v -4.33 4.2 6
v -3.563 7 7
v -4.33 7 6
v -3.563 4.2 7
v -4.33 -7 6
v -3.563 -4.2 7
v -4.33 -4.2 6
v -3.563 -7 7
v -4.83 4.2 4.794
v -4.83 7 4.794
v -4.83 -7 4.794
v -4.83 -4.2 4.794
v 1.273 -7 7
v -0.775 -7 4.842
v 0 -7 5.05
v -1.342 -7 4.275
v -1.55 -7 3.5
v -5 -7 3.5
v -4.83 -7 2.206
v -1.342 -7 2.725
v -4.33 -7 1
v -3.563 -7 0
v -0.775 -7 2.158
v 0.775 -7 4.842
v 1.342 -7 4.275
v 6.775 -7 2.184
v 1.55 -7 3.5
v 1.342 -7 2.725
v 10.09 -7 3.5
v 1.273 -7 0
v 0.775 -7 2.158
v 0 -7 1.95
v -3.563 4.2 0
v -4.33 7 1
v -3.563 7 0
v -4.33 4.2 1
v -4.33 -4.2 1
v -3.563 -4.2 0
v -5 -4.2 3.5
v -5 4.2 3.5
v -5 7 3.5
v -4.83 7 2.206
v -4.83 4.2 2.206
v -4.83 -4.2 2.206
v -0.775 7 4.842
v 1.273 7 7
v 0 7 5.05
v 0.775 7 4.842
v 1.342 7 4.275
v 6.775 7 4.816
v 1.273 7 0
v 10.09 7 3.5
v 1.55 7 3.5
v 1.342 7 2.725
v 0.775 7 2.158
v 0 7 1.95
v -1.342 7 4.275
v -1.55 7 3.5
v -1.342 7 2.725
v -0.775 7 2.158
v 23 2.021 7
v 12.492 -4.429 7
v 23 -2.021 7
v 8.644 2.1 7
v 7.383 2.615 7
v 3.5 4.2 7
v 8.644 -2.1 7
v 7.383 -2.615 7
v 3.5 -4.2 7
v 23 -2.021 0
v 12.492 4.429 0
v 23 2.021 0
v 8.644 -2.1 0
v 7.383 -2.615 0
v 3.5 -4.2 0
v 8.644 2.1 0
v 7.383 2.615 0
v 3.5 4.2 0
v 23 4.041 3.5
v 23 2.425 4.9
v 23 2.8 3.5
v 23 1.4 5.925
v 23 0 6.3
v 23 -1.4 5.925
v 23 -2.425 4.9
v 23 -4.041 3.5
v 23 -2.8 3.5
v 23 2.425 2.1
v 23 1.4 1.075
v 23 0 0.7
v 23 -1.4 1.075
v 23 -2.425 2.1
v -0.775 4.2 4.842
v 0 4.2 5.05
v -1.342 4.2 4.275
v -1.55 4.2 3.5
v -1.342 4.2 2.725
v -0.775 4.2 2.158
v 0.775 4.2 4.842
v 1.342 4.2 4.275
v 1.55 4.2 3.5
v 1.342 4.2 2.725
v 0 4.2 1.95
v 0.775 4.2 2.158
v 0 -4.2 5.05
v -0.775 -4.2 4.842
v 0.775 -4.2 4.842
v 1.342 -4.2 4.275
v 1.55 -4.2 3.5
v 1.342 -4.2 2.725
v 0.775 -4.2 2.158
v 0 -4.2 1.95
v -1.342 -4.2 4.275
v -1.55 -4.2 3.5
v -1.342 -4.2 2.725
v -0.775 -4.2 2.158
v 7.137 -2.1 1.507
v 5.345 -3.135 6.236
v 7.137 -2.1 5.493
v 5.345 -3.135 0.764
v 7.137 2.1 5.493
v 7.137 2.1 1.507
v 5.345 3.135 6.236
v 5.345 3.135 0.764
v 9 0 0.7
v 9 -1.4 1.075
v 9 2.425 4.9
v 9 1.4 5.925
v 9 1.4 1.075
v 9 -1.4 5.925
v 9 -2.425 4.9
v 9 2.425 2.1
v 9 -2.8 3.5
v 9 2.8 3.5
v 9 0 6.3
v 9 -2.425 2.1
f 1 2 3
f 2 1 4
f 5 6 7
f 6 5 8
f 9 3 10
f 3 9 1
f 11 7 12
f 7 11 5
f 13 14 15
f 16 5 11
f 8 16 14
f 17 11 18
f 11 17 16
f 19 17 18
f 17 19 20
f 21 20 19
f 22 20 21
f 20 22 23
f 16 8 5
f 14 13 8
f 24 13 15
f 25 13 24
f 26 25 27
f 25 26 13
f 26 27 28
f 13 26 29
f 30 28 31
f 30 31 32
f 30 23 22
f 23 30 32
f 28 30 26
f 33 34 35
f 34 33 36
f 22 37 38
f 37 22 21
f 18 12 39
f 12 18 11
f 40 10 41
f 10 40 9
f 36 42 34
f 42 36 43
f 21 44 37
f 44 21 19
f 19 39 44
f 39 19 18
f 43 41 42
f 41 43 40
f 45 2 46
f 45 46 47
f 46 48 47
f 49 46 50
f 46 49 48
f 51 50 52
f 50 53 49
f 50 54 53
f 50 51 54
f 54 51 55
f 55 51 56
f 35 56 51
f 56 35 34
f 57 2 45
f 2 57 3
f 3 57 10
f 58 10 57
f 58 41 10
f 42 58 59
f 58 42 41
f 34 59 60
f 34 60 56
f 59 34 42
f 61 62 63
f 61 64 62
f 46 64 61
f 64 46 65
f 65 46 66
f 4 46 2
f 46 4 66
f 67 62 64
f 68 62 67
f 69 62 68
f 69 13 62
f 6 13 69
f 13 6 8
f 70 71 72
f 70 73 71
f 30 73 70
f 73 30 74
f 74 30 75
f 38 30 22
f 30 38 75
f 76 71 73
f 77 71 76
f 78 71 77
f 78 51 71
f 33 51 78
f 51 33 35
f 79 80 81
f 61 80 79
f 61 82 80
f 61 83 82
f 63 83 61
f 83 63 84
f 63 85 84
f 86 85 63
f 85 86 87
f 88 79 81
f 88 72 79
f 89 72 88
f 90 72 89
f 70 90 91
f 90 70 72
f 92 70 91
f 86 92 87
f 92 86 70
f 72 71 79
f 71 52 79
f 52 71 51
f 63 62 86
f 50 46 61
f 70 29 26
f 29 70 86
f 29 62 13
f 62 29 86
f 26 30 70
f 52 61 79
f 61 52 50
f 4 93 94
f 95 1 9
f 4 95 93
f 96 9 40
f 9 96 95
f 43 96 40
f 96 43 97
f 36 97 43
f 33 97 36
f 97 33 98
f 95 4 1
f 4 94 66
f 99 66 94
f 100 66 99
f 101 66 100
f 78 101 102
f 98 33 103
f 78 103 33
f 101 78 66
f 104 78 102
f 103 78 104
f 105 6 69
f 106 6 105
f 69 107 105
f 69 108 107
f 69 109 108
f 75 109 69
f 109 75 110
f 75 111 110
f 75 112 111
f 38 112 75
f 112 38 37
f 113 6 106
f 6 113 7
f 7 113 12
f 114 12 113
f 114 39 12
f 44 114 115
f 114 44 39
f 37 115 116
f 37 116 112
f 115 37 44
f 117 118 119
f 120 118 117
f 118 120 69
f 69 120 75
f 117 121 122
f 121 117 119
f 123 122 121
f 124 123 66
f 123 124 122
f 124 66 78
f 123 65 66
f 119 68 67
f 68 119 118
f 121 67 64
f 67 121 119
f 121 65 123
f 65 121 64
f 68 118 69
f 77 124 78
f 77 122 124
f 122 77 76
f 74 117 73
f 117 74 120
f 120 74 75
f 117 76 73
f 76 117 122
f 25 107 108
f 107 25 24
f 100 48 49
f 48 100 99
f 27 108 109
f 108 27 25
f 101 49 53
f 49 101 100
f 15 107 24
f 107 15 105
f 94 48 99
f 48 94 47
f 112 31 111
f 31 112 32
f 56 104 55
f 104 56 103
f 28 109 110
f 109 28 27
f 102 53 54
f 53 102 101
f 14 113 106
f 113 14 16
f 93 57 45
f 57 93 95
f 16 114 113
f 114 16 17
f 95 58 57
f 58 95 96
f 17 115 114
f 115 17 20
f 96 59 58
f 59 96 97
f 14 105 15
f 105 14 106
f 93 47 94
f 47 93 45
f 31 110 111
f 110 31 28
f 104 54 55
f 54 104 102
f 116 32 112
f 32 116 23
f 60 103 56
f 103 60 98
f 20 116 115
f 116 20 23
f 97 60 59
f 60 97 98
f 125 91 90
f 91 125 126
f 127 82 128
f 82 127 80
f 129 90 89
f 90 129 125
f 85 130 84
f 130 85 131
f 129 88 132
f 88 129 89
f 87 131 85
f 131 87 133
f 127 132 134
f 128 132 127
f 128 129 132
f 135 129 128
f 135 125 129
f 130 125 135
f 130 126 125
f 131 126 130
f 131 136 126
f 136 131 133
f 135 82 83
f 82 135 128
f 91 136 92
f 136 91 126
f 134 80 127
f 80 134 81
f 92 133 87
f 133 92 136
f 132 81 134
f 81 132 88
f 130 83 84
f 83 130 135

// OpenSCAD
h = 7;
r = h/2 / cos(30);

module jaws() {
  difference() {
    union() {
      intersection () {
        rotate([90, 0, 0]) cylinder(r=5, h=14, center=true, $fn=24);
        translate([-4, 0, 0]) cube([10, 14, h], center=true);
      }
      intersection() {
        translate([10, 0, 0]) cube([26, 14, h], center=true);
        translate([10, 0, 0]) rotate([0, 90, 0]) rotate([0, 0, 30])
          cylinder(r1=10, r2=r, h=26, center=true, $fn=6);
      }
    }
    translate([-1.5, 0, 0]) cube([10, 8.4, 10], center=true);
    translate([3.5, 0, 0]) rotate([0, 0, 30])
      cylinder(r=4.2, h=10, center=true, $fn=6);
    translate([4, 0, 4]) rotate([0, 45, 0])
      rotate([0, 0, 30]) cylinder(r=4.2, h=8, center=true, $fn=6);
    translate([4, 0, -4]) rotate([0, -45, 0])
      rotate([0, 0, 30]) cylinder(r=4.2, h=8, center=true, $fn=6);
    rotate([90, 0, 0]) cylinder(r=1.55, h=40, center=true, $fn=12);
    translate([19, 0, 0]) rotate([0, 90, 0])
      cylinder(r=2.8, h=20, center=true, $fn=12);
  }
}

translate([0, 0, h/2]) jaws();
